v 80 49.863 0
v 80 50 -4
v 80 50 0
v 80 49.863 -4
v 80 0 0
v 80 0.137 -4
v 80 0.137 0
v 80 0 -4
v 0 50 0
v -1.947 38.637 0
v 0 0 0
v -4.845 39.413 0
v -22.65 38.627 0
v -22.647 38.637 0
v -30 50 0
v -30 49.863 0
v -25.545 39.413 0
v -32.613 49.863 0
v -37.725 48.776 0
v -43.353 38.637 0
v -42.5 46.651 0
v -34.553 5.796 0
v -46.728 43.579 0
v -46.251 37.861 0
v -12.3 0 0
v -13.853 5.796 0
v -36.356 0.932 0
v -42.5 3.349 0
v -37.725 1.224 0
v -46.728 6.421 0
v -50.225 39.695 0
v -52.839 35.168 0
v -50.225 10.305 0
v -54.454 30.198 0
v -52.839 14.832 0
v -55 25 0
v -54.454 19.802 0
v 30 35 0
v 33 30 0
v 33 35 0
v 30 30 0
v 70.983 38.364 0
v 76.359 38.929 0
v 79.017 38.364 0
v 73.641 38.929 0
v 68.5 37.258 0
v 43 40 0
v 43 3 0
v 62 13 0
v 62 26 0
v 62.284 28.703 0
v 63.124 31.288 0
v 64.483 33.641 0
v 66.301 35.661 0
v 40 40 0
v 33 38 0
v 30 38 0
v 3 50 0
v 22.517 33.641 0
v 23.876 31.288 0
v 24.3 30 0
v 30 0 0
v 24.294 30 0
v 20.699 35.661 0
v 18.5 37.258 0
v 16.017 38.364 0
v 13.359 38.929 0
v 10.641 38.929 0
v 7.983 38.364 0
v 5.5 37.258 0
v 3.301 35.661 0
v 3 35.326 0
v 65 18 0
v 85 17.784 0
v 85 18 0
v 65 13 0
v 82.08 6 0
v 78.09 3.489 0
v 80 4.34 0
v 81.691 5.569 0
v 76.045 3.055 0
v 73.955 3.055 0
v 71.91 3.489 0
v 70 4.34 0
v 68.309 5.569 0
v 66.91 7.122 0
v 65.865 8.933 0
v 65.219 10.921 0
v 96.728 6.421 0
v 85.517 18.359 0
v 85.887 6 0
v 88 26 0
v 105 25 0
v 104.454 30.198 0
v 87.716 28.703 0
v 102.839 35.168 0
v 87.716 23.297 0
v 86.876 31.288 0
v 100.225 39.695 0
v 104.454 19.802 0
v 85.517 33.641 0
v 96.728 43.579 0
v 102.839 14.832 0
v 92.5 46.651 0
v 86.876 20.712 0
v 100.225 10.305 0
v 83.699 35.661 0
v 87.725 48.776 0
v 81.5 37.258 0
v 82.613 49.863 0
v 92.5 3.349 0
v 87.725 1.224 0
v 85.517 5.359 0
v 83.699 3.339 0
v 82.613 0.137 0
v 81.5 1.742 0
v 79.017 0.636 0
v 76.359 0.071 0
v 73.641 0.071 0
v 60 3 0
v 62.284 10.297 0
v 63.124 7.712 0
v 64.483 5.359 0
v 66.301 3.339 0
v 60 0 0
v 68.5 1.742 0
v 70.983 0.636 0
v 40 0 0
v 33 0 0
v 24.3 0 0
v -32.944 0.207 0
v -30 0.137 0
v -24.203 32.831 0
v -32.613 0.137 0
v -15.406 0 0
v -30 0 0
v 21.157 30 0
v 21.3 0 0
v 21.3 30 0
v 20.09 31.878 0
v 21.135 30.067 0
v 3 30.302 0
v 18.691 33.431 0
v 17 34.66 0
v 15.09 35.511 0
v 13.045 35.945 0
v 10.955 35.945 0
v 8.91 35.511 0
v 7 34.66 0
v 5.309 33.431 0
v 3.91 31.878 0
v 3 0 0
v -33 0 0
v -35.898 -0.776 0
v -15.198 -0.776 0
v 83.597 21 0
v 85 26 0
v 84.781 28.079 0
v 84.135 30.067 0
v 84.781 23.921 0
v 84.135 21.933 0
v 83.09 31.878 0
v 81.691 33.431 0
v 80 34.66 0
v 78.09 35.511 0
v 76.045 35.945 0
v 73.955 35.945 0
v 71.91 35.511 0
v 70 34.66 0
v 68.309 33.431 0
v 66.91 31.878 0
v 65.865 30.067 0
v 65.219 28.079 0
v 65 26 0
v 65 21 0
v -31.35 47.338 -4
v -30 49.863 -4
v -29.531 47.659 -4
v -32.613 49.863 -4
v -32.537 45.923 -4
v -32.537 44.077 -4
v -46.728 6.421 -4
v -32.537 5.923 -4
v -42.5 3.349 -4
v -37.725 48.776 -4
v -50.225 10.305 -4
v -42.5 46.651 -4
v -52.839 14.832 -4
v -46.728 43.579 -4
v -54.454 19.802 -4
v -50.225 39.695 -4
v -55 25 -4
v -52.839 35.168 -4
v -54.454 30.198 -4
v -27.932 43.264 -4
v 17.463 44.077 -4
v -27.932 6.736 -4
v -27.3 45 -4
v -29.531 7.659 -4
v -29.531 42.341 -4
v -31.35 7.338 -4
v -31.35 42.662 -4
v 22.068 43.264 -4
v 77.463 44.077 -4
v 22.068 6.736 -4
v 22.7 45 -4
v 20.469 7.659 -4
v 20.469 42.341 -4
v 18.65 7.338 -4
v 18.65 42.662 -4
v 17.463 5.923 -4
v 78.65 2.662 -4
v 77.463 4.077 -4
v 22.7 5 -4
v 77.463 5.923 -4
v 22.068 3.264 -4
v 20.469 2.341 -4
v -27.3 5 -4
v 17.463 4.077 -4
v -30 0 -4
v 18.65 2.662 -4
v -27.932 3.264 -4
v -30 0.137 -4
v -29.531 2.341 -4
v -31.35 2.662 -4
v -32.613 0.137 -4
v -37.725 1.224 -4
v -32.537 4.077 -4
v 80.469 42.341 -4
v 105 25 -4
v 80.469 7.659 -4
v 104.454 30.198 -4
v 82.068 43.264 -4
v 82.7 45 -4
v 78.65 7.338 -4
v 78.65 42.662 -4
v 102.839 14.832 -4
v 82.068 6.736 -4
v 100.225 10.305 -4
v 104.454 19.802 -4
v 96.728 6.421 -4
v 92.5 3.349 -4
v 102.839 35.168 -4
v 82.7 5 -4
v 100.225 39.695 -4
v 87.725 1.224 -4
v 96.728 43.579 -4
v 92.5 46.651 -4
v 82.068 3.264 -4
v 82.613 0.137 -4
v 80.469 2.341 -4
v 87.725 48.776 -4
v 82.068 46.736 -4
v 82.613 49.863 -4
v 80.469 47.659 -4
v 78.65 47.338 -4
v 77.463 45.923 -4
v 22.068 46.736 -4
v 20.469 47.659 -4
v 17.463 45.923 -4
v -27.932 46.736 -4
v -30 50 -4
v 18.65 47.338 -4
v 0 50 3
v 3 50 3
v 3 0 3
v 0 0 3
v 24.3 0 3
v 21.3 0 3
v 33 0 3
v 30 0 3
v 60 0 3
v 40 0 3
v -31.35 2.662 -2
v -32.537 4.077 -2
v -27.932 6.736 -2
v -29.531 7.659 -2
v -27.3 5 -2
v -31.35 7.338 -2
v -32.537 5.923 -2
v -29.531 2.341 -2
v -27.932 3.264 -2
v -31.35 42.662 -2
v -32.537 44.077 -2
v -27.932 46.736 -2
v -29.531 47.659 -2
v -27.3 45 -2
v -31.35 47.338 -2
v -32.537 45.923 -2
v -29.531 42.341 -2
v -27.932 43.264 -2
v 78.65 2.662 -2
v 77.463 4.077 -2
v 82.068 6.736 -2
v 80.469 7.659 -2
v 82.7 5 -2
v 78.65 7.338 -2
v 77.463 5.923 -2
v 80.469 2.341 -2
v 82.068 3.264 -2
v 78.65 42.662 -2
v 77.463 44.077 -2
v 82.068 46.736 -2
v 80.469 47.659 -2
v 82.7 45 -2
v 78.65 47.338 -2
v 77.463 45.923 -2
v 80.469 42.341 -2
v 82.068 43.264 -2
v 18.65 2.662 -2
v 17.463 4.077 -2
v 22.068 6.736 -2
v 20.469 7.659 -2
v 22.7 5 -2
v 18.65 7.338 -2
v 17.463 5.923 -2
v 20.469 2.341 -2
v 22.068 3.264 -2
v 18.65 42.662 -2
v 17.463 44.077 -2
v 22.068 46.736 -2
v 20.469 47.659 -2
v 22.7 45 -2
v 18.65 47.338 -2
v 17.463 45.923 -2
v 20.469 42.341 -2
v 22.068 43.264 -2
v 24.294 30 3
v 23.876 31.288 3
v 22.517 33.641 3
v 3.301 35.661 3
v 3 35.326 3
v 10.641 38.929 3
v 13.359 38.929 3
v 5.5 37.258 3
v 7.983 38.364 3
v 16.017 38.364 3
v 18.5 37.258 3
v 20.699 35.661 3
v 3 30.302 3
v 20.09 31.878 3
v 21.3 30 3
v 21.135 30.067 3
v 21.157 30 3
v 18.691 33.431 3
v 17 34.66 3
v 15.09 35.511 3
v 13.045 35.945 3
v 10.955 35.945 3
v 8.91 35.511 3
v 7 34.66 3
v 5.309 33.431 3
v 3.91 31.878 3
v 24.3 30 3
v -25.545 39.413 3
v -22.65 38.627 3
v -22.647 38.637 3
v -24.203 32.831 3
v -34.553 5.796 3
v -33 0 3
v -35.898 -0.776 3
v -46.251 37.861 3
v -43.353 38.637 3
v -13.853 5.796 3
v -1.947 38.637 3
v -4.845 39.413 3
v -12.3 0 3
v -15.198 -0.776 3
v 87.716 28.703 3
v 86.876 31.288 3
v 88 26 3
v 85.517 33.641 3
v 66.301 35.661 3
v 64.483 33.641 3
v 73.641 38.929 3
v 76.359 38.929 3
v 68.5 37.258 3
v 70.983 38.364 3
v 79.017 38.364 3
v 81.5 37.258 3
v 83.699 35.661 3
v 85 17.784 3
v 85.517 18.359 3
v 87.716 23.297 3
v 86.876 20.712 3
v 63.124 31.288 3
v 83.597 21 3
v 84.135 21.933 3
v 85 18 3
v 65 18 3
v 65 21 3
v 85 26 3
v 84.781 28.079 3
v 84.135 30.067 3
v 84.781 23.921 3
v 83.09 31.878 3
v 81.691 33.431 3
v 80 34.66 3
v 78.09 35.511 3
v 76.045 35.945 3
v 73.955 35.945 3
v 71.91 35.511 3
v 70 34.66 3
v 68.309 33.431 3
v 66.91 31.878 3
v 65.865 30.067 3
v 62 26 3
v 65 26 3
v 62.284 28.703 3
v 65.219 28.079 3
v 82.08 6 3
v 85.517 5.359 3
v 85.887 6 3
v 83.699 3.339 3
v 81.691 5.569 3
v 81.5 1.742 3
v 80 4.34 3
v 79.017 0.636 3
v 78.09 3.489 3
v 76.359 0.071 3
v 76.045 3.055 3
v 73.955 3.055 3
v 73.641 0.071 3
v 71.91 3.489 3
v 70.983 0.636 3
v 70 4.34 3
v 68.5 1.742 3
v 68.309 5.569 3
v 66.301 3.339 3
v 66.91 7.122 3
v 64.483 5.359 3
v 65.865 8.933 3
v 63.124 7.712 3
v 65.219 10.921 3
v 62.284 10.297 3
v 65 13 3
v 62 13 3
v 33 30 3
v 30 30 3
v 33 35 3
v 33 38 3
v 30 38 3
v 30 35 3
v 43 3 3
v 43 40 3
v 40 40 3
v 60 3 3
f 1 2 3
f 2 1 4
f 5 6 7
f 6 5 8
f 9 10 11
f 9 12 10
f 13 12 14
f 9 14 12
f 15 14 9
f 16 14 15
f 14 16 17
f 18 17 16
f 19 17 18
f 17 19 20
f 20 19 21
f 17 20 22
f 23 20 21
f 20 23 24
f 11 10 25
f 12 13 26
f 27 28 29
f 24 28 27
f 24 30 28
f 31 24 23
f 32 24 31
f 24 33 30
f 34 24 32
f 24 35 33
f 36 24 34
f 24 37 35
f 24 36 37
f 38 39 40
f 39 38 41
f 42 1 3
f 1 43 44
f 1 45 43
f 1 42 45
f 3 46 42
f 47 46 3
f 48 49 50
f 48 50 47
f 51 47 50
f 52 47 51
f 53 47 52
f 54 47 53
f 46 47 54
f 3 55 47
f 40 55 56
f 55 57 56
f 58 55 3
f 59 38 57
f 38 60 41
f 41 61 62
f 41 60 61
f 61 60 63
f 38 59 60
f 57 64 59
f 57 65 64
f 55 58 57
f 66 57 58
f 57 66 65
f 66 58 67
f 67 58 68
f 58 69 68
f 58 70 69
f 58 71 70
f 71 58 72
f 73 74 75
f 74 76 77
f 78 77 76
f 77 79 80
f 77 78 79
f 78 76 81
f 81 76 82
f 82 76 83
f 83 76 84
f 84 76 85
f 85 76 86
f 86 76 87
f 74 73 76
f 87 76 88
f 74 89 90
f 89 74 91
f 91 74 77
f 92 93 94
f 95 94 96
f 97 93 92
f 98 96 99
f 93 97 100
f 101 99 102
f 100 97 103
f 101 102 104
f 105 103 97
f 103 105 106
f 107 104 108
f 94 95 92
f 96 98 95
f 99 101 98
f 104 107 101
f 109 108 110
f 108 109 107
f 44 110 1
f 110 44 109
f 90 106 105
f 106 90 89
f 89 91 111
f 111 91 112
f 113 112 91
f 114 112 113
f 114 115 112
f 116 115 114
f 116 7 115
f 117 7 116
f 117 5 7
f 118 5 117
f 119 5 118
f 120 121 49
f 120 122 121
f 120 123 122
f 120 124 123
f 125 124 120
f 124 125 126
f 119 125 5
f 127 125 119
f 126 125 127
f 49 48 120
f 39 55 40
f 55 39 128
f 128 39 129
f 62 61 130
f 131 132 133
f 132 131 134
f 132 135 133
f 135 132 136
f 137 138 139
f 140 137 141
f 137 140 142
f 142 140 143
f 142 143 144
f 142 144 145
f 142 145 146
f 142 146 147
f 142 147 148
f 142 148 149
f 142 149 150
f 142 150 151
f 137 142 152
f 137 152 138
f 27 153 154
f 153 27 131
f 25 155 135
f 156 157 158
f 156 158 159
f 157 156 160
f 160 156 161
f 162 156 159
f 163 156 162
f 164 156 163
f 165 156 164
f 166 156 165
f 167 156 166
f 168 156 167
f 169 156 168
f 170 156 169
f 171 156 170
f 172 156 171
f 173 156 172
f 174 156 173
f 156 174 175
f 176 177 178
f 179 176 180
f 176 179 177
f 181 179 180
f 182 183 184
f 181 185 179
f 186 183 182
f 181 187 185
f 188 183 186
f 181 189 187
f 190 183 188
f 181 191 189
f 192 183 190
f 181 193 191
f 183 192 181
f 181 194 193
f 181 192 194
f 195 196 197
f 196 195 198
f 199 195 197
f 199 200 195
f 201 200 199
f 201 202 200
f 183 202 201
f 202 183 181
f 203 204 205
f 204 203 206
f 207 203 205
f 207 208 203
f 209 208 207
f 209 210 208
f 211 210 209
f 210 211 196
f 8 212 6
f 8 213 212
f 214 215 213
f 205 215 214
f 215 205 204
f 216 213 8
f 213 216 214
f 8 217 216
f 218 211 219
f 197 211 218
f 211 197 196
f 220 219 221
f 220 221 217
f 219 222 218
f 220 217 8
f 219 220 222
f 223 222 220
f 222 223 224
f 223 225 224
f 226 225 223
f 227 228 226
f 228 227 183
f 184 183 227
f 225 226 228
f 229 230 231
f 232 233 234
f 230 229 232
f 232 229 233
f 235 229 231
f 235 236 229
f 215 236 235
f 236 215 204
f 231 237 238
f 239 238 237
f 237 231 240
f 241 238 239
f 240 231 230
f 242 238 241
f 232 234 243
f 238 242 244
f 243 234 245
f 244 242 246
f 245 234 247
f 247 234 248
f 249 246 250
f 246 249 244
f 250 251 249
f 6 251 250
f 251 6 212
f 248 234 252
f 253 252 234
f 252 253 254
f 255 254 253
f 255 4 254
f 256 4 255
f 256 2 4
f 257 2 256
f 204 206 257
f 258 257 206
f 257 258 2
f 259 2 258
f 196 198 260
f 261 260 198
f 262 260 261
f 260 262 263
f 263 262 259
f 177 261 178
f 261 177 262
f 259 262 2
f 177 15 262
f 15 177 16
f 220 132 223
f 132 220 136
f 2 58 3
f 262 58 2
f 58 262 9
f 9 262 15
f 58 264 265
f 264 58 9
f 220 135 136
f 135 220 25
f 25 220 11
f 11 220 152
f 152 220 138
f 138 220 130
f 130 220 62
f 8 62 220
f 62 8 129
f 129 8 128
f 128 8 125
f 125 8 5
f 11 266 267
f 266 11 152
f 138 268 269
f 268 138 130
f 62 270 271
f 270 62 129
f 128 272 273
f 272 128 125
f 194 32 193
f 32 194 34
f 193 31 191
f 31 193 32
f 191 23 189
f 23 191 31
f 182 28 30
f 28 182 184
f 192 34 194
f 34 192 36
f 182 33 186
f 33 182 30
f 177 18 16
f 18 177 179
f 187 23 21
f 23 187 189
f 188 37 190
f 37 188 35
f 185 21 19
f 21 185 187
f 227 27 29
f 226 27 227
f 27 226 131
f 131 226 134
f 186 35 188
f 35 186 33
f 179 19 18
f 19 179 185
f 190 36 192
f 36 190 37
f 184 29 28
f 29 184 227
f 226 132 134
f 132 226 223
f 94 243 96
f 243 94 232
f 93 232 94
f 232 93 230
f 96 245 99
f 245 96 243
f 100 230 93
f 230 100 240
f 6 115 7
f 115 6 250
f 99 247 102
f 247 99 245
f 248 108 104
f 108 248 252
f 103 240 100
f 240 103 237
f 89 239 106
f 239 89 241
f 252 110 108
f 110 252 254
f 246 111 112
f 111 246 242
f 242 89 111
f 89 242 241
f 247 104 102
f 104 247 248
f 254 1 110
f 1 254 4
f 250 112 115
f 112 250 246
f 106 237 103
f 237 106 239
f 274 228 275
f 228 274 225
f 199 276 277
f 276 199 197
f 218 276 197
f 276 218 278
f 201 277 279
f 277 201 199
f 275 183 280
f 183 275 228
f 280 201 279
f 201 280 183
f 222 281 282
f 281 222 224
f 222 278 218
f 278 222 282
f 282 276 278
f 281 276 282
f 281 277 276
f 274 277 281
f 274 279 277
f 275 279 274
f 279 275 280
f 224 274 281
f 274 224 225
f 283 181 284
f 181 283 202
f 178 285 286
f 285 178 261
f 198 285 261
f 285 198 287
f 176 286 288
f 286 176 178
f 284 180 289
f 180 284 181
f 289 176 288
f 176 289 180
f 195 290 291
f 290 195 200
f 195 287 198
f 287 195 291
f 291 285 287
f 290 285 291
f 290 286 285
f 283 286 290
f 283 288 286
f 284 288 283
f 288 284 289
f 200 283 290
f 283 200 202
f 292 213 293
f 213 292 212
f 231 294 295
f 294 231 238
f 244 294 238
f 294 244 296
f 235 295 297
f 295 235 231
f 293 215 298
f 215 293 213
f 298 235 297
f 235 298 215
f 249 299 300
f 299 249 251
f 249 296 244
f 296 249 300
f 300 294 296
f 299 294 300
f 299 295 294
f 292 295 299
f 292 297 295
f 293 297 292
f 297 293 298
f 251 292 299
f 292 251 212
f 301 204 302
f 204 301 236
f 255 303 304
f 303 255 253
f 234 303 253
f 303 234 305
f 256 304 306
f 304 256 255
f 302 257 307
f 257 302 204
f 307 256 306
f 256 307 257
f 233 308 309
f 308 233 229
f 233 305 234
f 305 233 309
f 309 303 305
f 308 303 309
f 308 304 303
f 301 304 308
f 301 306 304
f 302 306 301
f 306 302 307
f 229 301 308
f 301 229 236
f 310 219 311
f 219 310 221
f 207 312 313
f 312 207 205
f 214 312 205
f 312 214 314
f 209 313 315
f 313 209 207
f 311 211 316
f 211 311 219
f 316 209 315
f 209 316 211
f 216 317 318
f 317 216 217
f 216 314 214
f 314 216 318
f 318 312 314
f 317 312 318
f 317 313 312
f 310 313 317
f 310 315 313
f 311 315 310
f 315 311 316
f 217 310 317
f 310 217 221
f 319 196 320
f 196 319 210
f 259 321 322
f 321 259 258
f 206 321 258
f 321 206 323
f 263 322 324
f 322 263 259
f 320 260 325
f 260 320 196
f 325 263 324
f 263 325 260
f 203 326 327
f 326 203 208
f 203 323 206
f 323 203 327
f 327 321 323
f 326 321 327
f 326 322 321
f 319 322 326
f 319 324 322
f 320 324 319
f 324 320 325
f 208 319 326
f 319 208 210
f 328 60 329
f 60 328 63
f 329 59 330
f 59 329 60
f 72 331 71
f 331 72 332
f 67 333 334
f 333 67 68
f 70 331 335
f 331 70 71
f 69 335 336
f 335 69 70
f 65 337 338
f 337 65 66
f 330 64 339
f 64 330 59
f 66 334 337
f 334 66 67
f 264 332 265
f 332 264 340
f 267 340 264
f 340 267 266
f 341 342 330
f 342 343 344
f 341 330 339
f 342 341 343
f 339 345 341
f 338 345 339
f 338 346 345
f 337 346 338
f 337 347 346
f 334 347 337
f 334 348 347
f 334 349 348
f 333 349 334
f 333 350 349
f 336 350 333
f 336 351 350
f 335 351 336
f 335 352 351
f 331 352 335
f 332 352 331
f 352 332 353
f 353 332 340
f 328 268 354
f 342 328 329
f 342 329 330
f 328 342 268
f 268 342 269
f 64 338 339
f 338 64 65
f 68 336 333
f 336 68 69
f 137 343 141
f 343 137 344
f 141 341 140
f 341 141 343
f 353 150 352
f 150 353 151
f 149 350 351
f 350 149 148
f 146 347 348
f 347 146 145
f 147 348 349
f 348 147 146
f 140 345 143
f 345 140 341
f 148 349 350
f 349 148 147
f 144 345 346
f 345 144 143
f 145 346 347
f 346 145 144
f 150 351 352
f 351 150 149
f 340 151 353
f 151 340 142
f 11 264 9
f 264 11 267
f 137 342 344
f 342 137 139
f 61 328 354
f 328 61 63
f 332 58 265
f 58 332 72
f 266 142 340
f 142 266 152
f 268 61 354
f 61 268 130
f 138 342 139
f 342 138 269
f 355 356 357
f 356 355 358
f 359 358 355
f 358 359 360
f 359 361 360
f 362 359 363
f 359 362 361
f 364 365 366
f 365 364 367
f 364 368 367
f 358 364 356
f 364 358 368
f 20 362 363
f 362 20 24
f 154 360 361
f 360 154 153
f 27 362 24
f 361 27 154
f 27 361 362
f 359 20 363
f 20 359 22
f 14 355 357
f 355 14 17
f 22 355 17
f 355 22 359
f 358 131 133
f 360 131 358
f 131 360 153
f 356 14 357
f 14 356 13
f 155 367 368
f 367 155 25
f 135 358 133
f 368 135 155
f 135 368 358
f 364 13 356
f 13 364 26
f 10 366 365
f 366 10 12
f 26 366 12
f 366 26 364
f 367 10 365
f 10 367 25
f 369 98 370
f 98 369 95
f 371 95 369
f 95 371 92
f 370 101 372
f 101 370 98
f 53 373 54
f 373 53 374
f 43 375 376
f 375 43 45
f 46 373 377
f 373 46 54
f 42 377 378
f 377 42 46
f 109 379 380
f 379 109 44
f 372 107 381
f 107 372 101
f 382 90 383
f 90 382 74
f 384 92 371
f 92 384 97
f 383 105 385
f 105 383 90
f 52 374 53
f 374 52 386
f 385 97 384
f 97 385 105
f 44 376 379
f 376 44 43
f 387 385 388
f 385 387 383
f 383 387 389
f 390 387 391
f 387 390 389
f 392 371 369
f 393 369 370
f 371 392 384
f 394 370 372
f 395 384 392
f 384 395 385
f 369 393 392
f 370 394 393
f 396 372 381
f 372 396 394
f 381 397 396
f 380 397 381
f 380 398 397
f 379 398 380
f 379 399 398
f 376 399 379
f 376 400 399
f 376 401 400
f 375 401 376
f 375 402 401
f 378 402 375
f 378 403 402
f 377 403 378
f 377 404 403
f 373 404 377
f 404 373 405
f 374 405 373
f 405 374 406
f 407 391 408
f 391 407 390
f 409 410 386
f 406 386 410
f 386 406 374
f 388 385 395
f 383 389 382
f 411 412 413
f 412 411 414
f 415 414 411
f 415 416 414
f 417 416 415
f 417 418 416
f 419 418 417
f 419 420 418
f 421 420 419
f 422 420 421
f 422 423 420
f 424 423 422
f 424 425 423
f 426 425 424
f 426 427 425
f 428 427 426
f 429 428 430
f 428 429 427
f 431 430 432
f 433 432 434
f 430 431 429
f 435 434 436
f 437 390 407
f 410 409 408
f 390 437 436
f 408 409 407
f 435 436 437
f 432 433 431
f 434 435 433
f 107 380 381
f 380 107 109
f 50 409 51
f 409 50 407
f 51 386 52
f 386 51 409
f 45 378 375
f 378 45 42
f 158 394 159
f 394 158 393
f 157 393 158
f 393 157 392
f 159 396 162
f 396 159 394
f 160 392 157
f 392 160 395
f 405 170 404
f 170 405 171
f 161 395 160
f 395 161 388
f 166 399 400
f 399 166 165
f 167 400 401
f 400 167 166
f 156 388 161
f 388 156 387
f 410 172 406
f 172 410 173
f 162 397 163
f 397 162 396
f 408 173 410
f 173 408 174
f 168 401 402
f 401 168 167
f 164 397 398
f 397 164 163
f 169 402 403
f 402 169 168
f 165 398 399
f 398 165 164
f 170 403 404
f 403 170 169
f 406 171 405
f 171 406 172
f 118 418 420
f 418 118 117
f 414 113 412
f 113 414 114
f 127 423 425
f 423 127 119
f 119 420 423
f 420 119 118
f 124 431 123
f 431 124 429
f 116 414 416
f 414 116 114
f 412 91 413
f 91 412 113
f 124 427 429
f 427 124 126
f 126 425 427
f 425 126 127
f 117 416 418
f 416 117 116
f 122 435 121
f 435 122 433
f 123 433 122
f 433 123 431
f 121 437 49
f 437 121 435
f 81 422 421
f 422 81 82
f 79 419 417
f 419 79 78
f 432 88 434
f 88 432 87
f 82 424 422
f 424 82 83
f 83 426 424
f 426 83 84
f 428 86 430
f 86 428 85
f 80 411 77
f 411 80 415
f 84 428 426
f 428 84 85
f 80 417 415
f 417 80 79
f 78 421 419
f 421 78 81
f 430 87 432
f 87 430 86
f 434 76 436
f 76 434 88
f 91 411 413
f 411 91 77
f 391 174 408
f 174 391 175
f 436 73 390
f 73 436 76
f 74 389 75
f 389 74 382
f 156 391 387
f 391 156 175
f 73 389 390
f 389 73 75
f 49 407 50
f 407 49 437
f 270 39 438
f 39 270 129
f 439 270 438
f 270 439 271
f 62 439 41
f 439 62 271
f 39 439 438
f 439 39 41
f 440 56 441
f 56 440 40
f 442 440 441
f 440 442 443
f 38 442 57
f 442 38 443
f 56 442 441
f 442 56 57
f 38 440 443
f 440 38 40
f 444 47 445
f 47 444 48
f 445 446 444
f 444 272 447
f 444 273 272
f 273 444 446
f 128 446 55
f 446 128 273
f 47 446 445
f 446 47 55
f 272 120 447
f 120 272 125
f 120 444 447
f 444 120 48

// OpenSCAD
//основа
difference(){
union(){
translate([-30,0,-4]) cube([110,50,4]);
translate([-30,25,-4]) cylinder(4,25,25);
translate([80,25,-4]) cylinder(4,25,25);
}
translate([-30,5,-4]) cylinder(2,2.7,2.7);
translate([-30,45,-4]) cylinder(2,2.7,2.7);
translate([80,5,-4]) cylinder(2,2.7,2.7);
translate([80,45,-4]) cylinder(2,2.7,2.7);
translate([20,5,-4]) cylinder(2,2.7,2.7);
translate([20,45,-4]) cylinder(2,2.7,2.7);
}
//буква h
union(){
cube([3,50,3]);
difference(){  
  translate([12,26,0]) cylinder(3,13,13);
  translate([12,26,0]) cylinder(3,10,10);
  translate([0,10,0]) cube([30,20,3]);
  translate([-3,0,0]) cube([3,40,3]);

}
  translate([21.3,0,0]) cube([3,30,3]);
}
//буква w
translate([-50,0,0])
  rotate([0,0,90])
union(){
  translate([0,-17,0]) rotate([0,0,15]) cube([40,3,3]);
  translate([0,-17,0]) rotate([0,0,-15]) cube([40,3,3]);

 translate([0,-37.7,0]) rotate([0,0,15]) cube([40,3,3]);

 translate([0,-37.7,0])
  rotate([0,0,-15]) cube([40,3,3]);
}

//буква i
  translate([30,0,0]) cube([3,30,3]);
  translate([30,35,0]) cube(3);

//буква l
  translate([40,0,0]) cube([3,40,3]);
  translate([40,0,0]) cube([20,3,3]);

//буква e
translate([35,0,0])
union(){
translate([28,18,0]) cube([22,3,3]);
translate([27,13,0]) cube([3,13,3]);
difference(){
union(){
	
  difference(){
  translate([40,26,0]) cylinder(3,13,13);
  translate([40,26,0]) cylinder(3,10,10);
  translate([32,12,0]) cube([16,10,3]);

}

difference(){
  translate([40,13,0]) cylinder(3,13,13);
  translate([40,13,0]) cylinder(3,10,10);
  translate([32,15,0]) cube([19,13,3]);
  translate([40,6,0]) cube(20);
}
}
translate([30,13,0]) cube([3,13,3]);
translate([40,10,0]) cube(10);
}
}
